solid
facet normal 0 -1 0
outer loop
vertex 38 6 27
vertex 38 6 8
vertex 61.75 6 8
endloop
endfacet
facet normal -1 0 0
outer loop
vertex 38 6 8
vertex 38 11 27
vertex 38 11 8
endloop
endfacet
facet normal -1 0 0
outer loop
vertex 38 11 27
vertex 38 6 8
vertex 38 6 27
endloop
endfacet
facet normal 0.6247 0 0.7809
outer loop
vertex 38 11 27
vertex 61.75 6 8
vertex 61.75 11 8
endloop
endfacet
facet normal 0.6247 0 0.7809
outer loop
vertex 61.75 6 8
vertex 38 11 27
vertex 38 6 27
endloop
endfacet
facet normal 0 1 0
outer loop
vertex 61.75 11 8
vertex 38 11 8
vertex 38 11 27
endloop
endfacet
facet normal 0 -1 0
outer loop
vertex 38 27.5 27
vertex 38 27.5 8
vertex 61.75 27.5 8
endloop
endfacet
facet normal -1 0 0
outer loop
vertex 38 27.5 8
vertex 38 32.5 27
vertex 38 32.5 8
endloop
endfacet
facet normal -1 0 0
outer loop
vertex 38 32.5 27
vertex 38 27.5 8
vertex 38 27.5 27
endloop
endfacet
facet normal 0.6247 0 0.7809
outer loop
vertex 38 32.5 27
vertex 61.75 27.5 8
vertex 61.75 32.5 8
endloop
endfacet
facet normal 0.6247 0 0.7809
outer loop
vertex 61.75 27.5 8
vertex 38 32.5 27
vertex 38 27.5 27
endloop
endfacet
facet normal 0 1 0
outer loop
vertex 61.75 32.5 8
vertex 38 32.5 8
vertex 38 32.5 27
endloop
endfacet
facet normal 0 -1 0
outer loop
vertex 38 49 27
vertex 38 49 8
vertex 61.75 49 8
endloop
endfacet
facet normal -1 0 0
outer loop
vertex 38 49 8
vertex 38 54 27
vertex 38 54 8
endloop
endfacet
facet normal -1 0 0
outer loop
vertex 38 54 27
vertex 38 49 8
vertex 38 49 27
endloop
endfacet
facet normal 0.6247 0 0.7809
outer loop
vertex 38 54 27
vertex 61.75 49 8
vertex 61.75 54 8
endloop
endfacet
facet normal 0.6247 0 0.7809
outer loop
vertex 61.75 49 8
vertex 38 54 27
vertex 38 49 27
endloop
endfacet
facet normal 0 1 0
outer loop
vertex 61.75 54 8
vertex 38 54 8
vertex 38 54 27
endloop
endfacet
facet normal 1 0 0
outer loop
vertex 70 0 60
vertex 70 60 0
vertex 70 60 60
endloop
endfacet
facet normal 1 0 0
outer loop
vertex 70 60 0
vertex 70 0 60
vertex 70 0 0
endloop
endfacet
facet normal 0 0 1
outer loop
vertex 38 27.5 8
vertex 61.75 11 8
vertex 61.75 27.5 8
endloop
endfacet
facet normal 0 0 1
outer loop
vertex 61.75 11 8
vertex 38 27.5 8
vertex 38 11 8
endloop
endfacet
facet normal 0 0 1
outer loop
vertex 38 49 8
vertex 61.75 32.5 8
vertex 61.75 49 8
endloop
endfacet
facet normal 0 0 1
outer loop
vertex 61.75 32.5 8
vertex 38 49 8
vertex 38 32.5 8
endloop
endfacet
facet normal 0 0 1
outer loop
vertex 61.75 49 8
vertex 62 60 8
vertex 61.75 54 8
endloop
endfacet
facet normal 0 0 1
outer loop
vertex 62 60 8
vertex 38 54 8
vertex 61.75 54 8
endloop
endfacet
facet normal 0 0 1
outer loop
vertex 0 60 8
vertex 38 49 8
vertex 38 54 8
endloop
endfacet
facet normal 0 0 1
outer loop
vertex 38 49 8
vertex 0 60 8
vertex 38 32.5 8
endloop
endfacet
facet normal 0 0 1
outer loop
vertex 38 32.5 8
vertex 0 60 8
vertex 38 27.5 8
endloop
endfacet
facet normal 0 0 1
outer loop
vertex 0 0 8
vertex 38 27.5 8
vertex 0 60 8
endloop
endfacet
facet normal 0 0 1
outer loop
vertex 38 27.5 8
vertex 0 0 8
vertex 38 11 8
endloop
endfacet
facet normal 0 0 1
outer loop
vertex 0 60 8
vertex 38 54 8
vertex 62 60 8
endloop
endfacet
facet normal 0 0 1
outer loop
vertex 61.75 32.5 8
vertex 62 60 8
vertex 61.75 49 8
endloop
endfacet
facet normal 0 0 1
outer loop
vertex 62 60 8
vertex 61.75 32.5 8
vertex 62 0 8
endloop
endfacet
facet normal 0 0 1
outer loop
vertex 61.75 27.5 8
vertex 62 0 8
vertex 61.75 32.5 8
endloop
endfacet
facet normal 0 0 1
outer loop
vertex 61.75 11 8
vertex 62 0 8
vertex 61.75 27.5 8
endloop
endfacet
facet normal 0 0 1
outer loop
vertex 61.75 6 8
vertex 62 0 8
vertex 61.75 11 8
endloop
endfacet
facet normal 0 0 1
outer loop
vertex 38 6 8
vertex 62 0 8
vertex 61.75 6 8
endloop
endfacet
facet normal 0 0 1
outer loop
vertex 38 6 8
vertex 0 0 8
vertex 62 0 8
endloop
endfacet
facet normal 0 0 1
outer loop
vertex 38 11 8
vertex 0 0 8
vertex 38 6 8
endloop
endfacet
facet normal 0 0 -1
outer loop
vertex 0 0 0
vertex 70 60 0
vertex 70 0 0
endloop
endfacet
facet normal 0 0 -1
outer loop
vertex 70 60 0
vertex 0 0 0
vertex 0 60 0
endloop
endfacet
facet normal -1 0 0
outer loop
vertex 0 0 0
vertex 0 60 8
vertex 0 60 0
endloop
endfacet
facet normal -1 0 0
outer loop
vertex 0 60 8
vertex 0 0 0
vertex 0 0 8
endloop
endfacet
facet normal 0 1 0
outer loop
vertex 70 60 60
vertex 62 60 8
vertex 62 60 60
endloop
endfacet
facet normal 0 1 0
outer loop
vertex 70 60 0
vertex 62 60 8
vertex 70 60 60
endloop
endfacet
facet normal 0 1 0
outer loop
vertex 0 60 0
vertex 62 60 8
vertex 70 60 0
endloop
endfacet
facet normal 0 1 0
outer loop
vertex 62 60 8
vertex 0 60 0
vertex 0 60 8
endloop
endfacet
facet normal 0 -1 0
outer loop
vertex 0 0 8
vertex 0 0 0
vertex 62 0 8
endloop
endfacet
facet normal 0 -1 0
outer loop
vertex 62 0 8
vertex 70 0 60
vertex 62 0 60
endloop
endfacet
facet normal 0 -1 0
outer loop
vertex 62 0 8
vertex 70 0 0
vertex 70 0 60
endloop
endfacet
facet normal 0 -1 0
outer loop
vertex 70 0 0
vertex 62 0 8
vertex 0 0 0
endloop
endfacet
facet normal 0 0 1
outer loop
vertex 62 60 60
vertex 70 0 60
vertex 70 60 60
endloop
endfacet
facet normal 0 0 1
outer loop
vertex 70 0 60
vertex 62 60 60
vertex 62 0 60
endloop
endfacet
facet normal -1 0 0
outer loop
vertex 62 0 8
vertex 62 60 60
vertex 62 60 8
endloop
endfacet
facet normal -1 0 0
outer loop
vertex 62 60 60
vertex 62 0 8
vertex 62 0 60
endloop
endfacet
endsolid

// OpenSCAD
$fn = 32;

// ----------------------------------------------------------------------
// Rib bracket: 3-gusset L bracket
// ----------------------------------------------------------------------

// --- parameters (mm) ---
base_l = 70;              // foot length, X
base_w = 60;              // foot width, Y
base_t = 8;               // foot thickness
plate_t = 8;              // upright plate thickness
plate_h = 60;             // overall height
gus_l = 24;               // gusset leg along the foot
gus_h = 20;               // gusset height
gus_t = 5;                // gusset thickness
gus_edge = 6;             // gusset margin from the foot edge
n_gus = 3;                // gusset count

gus_pitch = (base_w - 2 * gus_edge - gus_t) / (n_gus - 1);  // gusset pitch

union() {
  cube([base_l, base_w, base_t]);
  translate([base_l - plate_t, 0, base_t - 1])
    cube([plate_t, base_w, plate_h - base_t + 1]);
  for (i = [0 : n_gus - 1])
    translate([base_l - plate_t - gus_l, gus_edge + i * gus_pitch, base_t - 1])
      rotate([-90, 0, 0])
        linear_extrude(height = gus_t)
          polygon(points = [[0, 0], [gus_l + 1, 0], [0, -gus_h]]);
}
